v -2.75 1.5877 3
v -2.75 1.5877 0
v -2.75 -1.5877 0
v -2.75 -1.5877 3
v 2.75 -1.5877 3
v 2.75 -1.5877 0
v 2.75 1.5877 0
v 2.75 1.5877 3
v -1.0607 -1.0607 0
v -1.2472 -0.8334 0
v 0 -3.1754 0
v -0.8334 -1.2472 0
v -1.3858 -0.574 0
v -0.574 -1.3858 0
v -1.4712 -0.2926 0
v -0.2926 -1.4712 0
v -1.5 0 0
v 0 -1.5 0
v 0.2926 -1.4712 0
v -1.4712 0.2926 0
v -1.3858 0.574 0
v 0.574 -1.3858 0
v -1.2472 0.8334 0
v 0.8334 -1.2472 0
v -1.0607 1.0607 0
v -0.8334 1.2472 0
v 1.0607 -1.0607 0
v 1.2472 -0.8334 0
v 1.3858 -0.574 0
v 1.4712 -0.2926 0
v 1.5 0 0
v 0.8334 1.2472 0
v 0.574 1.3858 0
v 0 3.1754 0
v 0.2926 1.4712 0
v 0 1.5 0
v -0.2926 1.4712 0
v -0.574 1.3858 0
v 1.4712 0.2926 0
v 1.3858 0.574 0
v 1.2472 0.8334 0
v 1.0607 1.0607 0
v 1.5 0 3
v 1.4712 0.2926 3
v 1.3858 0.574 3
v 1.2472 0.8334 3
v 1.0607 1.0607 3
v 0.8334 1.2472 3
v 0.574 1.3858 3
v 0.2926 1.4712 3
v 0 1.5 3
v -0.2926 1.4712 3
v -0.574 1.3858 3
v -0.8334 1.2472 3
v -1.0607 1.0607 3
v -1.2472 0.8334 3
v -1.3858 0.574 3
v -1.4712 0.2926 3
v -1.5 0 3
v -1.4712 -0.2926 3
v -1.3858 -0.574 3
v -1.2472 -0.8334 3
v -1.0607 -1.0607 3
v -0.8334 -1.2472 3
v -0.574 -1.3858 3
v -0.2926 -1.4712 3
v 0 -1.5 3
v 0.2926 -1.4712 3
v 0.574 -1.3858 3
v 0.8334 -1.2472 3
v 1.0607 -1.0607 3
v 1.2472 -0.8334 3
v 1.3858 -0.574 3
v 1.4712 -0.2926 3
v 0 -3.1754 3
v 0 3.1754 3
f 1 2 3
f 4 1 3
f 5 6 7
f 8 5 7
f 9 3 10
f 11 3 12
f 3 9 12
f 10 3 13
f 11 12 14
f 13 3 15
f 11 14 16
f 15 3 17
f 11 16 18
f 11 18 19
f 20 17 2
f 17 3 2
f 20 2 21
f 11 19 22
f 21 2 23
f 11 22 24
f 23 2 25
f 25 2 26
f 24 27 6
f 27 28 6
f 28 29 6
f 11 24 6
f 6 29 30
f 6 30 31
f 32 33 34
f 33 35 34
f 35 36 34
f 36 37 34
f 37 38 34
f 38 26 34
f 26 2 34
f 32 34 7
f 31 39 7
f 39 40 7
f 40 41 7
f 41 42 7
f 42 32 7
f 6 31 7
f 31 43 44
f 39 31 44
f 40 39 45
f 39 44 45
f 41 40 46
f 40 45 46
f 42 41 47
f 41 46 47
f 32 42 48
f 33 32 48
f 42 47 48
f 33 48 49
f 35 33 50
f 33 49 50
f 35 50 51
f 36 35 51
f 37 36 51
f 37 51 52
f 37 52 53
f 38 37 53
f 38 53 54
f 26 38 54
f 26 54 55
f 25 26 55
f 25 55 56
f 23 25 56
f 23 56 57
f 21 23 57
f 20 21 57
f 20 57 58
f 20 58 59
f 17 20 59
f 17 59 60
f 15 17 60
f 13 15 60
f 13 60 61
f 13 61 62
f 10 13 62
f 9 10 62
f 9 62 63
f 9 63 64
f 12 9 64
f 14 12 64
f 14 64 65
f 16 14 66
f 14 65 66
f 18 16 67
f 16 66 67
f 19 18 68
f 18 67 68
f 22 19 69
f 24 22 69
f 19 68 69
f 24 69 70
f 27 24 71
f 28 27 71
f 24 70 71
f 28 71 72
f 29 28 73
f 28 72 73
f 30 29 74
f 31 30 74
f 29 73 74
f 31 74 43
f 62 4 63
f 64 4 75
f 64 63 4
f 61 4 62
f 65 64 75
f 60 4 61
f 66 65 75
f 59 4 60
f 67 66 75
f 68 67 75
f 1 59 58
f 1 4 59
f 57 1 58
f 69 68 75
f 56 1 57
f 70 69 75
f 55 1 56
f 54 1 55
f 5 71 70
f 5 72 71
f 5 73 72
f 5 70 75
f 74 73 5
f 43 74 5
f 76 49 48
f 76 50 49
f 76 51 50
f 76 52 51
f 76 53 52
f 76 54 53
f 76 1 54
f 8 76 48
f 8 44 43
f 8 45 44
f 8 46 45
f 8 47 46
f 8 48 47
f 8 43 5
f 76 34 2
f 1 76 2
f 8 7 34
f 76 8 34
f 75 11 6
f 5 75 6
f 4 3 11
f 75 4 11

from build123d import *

# Parameters (mm, degrees)
F1_DEPTH = 3
F2_R     = 1.5
F3_DEPTH = 3.001


with BuildPart() as f1:
    # F0 (on Top) → F1 (new body)
    with BuildSketch(Plane.XY):
        Polygon((0, 3.175426), (-2.75, 1.587713), (-2.75, -1.587713), (0, -3.175426), (2.75, -1.587713), (2.75, 1.587713), align=None)
    extrude(amount=F1_DEPTH)

    # F2 (on face) → F3 (cut, through all)
    with BuildSketch(Plane.XY.offset(3)):
        Circle(F2_R)
    extrude(amount=-F3_DEPTH, mode=Mode.SUBTRACT)


solid = f1.part
